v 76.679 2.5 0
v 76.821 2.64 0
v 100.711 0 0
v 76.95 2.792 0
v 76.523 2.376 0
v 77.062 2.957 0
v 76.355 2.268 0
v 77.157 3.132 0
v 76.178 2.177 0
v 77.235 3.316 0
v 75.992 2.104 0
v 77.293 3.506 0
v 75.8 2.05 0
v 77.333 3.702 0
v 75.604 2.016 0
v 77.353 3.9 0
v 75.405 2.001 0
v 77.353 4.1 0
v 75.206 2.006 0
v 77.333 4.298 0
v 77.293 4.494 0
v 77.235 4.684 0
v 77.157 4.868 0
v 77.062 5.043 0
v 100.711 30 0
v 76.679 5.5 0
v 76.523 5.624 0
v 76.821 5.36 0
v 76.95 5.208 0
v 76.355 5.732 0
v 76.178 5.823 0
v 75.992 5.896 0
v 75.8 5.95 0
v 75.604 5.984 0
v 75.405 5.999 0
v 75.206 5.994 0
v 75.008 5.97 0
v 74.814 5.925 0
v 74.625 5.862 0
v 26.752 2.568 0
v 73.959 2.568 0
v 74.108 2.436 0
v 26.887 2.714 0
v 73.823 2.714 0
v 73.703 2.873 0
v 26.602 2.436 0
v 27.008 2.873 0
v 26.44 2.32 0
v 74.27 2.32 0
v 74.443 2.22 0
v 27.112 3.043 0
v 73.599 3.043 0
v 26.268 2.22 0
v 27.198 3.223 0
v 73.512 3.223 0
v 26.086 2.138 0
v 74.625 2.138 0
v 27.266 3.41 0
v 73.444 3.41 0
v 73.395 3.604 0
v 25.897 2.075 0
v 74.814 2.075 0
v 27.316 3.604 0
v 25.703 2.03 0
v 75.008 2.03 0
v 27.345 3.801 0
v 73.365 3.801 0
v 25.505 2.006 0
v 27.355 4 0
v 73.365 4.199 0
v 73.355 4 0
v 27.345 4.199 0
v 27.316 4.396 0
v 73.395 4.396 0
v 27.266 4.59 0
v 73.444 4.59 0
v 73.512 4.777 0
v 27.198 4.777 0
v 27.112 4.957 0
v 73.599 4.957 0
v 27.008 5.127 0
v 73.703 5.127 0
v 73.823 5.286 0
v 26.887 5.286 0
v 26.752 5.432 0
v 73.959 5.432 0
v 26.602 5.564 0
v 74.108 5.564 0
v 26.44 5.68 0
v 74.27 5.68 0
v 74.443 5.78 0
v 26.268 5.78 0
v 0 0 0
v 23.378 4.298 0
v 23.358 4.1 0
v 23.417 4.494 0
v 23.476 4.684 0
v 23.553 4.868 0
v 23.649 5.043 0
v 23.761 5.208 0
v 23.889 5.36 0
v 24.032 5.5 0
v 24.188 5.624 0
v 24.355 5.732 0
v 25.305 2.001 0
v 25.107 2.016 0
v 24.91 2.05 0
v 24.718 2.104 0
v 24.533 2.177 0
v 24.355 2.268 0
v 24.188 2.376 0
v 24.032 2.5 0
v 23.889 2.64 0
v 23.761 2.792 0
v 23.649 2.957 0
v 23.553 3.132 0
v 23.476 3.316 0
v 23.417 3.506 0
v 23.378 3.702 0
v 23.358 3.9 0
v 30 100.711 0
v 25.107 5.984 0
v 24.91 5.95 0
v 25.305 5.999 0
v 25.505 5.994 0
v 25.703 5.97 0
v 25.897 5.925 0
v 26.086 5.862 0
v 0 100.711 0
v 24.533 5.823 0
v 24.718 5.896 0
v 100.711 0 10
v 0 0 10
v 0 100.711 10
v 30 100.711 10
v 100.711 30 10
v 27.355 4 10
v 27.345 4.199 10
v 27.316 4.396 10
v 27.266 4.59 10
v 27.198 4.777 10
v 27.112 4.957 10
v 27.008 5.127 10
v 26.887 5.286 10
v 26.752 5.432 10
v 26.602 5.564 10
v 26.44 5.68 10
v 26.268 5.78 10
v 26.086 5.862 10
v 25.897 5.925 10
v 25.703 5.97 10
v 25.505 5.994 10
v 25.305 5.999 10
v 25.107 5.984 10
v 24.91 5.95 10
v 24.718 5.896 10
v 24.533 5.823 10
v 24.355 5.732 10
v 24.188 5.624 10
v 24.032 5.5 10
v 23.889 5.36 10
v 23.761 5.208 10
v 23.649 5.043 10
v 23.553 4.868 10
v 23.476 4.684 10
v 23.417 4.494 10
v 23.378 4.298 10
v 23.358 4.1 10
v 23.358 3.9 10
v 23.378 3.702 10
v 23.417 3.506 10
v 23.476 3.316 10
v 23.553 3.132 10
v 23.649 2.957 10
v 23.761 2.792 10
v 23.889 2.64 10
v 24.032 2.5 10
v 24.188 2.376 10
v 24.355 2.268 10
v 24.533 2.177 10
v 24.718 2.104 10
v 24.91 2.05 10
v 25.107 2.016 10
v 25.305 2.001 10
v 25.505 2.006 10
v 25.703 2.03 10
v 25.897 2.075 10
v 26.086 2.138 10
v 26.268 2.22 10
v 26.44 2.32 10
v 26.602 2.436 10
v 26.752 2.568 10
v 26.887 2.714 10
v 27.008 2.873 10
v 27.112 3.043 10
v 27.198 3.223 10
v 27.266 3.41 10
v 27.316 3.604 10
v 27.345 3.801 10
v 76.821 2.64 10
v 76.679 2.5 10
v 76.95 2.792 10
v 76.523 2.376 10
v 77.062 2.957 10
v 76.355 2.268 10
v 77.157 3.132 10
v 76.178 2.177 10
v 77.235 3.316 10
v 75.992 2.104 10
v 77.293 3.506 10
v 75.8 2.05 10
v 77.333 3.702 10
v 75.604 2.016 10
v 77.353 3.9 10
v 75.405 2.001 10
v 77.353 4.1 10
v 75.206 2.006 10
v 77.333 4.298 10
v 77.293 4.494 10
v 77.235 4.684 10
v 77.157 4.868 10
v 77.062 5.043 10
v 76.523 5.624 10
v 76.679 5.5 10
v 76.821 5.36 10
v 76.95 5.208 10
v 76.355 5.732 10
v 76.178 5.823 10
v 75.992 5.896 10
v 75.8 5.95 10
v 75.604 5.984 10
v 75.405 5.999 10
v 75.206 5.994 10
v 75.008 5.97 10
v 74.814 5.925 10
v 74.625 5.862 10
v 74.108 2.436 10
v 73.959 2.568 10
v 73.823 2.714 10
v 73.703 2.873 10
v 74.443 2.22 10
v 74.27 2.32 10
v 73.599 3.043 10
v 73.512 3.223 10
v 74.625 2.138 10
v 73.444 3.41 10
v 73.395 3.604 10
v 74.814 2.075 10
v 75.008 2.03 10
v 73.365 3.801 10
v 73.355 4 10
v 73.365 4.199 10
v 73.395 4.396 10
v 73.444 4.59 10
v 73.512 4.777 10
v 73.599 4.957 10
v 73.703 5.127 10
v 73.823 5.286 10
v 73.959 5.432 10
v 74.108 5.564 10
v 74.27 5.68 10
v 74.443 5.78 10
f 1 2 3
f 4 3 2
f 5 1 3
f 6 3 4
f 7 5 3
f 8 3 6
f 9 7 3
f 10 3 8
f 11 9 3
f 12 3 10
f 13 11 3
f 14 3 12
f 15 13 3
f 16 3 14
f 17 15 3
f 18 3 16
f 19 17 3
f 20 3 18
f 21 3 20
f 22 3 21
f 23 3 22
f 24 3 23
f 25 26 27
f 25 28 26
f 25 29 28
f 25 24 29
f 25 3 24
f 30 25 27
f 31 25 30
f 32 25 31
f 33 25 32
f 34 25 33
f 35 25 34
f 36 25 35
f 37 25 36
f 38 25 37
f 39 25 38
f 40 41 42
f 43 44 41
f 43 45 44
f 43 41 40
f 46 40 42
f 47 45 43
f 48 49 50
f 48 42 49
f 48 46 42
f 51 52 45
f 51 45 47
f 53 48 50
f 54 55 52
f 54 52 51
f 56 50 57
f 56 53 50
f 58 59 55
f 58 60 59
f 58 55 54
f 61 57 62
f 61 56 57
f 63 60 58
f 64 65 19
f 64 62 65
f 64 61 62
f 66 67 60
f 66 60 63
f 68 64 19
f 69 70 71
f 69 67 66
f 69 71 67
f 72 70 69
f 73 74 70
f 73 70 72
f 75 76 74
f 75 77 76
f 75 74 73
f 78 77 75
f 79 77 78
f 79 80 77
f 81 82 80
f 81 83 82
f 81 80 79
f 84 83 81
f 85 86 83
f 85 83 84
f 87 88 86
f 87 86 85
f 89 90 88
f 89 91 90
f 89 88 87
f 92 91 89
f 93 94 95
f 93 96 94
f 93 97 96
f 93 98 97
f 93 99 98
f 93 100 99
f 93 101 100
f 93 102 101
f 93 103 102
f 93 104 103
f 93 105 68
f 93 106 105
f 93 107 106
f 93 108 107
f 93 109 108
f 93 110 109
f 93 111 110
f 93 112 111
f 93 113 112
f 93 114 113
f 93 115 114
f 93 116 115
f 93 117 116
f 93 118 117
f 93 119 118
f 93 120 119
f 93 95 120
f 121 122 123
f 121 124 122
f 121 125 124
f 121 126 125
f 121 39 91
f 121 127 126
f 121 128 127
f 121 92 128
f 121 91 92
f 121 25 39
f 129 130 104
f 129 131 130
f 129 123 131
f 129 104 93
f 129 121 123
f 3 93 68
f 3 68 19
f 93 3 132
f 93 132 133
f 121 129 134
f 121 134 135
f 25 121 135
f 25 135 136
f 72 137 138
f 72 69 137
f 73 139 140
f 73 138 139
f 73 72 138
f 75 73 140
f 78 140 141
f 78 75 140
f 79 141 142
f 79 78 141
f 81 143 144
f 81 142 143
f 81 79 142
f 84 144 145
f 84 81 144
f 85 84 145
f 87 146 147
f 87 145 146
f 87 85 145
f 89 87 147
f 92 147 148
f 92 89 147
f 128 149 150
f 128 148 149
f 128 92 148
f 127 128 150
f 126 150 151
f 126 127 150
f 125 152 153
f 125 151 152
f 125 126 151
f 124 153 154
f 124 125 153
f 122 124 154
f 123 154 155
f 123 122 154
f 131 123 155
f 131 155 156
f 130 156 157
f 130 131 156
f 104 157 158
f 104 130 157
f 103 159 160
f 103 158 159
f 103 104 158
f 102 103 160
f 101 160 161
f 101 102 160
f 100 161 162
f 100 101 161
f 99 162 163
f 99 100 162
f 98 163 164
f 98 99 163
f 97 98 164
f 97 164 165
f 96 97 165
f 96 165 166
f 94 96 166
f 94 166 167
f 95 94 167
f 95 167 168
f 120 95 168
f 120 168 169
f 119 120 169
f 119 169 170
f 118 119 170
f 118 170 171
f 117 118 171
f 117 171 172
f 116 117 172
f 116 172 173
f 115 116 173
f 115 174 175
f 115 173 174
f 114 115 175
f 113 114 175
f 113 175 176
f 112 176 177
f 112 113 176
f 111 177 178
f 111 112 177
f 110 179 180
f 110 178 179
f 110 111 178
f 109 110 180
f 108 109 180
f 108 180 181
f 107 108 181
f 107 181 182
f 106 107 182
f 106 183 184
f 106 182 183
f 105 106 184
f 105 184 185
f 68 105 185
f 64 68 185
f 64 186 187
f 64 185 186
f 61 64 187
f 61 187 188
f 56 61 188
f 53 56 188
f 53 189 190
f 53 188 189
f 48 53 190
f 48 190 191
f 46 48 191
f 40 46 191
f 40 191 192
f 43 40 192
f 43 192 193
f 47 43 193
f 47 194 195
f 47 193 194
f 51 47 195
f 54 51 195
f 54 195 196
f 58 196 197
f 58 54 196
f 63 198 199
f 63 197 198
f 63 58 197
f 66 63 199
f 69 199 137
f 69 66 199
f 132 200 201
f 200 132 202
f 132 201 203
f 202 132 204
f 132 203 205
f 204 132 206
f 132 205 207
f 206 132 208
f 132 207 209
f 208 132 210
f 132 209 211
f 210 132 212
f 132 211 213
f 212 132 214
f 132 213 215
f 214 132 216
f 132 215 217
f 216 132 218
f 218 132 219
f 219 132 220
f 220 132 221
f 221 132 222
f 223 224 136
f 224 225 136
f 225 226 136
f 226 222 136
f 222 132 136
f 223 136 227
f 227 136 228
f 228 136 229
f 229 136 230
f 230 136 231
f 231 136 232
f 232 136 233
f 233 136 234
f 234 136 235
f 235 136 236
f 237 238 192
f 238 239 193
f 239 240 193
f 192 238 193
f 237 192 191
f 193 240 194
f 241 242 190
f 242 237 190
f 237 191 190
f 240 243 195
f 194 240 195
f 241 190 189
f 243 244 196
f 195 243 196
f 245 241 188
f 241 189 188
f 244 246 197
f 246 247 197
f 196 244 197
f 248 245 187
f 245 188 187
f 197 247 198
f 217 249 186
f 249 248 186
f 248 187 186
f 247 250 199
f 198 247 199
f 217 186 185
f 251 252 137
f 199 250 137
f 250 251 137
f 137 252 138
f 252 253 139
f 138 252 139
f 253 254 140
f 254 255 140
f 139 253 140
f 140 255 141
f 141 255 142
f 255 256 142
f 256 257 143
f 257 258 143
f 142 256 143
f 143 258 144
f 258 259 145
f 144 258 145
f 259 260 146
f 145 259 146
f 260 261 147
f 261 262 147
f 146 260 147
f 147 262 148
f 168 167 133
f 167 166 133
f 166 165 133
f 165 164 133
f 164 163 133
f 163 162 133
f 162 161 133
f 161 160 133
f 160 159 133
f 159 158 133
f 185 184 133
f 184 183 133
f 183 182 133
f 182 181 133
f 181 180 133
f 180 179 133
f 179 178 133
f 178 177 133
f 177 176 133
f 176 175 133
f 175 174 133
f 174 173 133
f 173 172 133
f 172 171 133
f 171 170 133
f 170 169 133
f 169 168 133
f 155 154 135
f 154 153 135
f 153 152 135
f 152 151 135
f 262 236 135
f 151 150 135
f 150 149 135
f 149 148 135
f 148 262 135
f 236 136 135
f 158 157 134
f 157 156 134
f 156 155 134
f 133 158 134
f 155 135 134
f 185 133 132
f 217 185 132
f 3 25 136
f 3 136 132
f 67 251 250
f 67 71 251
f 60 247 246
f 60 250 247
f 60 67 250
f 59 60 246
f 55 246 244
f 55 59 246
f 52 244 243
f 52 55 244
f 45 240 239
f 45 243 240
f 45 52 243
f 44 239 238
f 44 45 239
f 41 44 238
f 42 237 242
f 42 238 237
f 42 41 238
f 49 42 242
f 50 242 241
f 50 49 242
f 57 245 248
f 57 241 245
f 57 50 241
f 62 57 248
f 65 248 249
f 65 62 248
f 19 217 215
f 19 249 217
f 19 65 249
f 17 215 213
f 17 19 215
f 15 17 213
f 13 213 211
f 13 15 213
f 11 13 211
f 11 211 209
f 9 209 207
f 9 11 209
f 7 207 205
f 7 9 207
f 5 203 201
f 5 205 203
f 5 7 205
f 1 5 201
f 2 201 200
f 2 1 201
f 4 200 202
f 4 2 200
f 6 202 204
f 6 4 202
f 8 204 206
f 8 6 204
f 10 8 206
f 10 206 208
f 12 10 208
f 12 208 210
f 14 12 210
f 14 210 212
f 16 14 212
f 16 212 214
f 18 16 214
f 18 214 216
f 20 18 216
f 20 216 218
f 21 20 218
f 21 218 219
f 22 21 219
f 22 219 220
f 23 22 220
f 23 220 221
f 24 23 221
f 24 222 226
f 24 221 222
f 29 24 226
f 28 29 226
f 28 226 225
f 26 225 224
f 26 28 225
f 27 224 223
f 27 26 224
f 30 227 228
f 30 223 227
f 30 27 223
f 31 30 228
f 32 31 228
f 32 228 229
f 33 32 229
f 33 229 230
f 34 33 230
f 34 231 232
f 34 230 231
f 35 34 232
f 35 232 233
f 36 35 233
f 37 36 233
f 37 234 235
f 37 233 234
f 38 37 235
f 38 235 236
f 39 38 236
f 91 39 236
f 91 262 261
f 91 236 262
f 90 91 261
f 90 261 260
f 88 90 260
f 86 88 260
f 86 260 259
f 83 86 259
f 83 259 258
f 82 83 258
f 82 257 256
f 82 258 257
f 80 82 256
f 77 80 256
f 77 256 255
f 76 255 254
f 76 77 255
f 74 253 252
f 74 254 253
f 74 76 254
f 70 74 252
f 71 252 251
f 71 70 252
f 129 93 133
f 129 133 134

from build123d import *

# Parameters (mm, degrees)
BOSS_EXTRU_1_DEPTH           = 10
ENL_V_MAT_EXTRU_1_DEPTH      = 143.777033777
ENL_V_MAT_EXTRU_1_DEPTH_BACK = 143.777033777
ESQUISSE2_R                  = 2


with BuildPart() as part:
    # Esquisse1 → Boss.-Extru.1 (new body)
    with BuildSketch(Plane.XY):
        Polygon((0, 0), (0, 100.710678119), (30, 100.710678119), (100.710678119, 30), (100.710678119, 0), align=None)
    extrude(amount=BOSS_EXTRU_1_DEPTH)

    # Esquisse2 → Enlèv. mat.-Extru.1 (cut, two sides: drawn at the far end of the back side and taken through both)
    with BuildSketch(Plane.XY.offset(10).offset(-ENL_V_MAT_EXTRU_1_DEPTH_BACK)):
        with Locations((25.355339059, 4)):
            Circle(ESQUISSE2_R)
        with Locations(Location((75.355339059, 4, 0), (0, 0, 180))):
            Circle(ESQUISSE2_R)
    extrude(amount=ENL_V_MAT_EXTRU_1_DEPTH + ENL_V_MAT_EXTRU_1_DEPTH_BACK, mode=Mode.SUBTRACT)


solid = part.part
